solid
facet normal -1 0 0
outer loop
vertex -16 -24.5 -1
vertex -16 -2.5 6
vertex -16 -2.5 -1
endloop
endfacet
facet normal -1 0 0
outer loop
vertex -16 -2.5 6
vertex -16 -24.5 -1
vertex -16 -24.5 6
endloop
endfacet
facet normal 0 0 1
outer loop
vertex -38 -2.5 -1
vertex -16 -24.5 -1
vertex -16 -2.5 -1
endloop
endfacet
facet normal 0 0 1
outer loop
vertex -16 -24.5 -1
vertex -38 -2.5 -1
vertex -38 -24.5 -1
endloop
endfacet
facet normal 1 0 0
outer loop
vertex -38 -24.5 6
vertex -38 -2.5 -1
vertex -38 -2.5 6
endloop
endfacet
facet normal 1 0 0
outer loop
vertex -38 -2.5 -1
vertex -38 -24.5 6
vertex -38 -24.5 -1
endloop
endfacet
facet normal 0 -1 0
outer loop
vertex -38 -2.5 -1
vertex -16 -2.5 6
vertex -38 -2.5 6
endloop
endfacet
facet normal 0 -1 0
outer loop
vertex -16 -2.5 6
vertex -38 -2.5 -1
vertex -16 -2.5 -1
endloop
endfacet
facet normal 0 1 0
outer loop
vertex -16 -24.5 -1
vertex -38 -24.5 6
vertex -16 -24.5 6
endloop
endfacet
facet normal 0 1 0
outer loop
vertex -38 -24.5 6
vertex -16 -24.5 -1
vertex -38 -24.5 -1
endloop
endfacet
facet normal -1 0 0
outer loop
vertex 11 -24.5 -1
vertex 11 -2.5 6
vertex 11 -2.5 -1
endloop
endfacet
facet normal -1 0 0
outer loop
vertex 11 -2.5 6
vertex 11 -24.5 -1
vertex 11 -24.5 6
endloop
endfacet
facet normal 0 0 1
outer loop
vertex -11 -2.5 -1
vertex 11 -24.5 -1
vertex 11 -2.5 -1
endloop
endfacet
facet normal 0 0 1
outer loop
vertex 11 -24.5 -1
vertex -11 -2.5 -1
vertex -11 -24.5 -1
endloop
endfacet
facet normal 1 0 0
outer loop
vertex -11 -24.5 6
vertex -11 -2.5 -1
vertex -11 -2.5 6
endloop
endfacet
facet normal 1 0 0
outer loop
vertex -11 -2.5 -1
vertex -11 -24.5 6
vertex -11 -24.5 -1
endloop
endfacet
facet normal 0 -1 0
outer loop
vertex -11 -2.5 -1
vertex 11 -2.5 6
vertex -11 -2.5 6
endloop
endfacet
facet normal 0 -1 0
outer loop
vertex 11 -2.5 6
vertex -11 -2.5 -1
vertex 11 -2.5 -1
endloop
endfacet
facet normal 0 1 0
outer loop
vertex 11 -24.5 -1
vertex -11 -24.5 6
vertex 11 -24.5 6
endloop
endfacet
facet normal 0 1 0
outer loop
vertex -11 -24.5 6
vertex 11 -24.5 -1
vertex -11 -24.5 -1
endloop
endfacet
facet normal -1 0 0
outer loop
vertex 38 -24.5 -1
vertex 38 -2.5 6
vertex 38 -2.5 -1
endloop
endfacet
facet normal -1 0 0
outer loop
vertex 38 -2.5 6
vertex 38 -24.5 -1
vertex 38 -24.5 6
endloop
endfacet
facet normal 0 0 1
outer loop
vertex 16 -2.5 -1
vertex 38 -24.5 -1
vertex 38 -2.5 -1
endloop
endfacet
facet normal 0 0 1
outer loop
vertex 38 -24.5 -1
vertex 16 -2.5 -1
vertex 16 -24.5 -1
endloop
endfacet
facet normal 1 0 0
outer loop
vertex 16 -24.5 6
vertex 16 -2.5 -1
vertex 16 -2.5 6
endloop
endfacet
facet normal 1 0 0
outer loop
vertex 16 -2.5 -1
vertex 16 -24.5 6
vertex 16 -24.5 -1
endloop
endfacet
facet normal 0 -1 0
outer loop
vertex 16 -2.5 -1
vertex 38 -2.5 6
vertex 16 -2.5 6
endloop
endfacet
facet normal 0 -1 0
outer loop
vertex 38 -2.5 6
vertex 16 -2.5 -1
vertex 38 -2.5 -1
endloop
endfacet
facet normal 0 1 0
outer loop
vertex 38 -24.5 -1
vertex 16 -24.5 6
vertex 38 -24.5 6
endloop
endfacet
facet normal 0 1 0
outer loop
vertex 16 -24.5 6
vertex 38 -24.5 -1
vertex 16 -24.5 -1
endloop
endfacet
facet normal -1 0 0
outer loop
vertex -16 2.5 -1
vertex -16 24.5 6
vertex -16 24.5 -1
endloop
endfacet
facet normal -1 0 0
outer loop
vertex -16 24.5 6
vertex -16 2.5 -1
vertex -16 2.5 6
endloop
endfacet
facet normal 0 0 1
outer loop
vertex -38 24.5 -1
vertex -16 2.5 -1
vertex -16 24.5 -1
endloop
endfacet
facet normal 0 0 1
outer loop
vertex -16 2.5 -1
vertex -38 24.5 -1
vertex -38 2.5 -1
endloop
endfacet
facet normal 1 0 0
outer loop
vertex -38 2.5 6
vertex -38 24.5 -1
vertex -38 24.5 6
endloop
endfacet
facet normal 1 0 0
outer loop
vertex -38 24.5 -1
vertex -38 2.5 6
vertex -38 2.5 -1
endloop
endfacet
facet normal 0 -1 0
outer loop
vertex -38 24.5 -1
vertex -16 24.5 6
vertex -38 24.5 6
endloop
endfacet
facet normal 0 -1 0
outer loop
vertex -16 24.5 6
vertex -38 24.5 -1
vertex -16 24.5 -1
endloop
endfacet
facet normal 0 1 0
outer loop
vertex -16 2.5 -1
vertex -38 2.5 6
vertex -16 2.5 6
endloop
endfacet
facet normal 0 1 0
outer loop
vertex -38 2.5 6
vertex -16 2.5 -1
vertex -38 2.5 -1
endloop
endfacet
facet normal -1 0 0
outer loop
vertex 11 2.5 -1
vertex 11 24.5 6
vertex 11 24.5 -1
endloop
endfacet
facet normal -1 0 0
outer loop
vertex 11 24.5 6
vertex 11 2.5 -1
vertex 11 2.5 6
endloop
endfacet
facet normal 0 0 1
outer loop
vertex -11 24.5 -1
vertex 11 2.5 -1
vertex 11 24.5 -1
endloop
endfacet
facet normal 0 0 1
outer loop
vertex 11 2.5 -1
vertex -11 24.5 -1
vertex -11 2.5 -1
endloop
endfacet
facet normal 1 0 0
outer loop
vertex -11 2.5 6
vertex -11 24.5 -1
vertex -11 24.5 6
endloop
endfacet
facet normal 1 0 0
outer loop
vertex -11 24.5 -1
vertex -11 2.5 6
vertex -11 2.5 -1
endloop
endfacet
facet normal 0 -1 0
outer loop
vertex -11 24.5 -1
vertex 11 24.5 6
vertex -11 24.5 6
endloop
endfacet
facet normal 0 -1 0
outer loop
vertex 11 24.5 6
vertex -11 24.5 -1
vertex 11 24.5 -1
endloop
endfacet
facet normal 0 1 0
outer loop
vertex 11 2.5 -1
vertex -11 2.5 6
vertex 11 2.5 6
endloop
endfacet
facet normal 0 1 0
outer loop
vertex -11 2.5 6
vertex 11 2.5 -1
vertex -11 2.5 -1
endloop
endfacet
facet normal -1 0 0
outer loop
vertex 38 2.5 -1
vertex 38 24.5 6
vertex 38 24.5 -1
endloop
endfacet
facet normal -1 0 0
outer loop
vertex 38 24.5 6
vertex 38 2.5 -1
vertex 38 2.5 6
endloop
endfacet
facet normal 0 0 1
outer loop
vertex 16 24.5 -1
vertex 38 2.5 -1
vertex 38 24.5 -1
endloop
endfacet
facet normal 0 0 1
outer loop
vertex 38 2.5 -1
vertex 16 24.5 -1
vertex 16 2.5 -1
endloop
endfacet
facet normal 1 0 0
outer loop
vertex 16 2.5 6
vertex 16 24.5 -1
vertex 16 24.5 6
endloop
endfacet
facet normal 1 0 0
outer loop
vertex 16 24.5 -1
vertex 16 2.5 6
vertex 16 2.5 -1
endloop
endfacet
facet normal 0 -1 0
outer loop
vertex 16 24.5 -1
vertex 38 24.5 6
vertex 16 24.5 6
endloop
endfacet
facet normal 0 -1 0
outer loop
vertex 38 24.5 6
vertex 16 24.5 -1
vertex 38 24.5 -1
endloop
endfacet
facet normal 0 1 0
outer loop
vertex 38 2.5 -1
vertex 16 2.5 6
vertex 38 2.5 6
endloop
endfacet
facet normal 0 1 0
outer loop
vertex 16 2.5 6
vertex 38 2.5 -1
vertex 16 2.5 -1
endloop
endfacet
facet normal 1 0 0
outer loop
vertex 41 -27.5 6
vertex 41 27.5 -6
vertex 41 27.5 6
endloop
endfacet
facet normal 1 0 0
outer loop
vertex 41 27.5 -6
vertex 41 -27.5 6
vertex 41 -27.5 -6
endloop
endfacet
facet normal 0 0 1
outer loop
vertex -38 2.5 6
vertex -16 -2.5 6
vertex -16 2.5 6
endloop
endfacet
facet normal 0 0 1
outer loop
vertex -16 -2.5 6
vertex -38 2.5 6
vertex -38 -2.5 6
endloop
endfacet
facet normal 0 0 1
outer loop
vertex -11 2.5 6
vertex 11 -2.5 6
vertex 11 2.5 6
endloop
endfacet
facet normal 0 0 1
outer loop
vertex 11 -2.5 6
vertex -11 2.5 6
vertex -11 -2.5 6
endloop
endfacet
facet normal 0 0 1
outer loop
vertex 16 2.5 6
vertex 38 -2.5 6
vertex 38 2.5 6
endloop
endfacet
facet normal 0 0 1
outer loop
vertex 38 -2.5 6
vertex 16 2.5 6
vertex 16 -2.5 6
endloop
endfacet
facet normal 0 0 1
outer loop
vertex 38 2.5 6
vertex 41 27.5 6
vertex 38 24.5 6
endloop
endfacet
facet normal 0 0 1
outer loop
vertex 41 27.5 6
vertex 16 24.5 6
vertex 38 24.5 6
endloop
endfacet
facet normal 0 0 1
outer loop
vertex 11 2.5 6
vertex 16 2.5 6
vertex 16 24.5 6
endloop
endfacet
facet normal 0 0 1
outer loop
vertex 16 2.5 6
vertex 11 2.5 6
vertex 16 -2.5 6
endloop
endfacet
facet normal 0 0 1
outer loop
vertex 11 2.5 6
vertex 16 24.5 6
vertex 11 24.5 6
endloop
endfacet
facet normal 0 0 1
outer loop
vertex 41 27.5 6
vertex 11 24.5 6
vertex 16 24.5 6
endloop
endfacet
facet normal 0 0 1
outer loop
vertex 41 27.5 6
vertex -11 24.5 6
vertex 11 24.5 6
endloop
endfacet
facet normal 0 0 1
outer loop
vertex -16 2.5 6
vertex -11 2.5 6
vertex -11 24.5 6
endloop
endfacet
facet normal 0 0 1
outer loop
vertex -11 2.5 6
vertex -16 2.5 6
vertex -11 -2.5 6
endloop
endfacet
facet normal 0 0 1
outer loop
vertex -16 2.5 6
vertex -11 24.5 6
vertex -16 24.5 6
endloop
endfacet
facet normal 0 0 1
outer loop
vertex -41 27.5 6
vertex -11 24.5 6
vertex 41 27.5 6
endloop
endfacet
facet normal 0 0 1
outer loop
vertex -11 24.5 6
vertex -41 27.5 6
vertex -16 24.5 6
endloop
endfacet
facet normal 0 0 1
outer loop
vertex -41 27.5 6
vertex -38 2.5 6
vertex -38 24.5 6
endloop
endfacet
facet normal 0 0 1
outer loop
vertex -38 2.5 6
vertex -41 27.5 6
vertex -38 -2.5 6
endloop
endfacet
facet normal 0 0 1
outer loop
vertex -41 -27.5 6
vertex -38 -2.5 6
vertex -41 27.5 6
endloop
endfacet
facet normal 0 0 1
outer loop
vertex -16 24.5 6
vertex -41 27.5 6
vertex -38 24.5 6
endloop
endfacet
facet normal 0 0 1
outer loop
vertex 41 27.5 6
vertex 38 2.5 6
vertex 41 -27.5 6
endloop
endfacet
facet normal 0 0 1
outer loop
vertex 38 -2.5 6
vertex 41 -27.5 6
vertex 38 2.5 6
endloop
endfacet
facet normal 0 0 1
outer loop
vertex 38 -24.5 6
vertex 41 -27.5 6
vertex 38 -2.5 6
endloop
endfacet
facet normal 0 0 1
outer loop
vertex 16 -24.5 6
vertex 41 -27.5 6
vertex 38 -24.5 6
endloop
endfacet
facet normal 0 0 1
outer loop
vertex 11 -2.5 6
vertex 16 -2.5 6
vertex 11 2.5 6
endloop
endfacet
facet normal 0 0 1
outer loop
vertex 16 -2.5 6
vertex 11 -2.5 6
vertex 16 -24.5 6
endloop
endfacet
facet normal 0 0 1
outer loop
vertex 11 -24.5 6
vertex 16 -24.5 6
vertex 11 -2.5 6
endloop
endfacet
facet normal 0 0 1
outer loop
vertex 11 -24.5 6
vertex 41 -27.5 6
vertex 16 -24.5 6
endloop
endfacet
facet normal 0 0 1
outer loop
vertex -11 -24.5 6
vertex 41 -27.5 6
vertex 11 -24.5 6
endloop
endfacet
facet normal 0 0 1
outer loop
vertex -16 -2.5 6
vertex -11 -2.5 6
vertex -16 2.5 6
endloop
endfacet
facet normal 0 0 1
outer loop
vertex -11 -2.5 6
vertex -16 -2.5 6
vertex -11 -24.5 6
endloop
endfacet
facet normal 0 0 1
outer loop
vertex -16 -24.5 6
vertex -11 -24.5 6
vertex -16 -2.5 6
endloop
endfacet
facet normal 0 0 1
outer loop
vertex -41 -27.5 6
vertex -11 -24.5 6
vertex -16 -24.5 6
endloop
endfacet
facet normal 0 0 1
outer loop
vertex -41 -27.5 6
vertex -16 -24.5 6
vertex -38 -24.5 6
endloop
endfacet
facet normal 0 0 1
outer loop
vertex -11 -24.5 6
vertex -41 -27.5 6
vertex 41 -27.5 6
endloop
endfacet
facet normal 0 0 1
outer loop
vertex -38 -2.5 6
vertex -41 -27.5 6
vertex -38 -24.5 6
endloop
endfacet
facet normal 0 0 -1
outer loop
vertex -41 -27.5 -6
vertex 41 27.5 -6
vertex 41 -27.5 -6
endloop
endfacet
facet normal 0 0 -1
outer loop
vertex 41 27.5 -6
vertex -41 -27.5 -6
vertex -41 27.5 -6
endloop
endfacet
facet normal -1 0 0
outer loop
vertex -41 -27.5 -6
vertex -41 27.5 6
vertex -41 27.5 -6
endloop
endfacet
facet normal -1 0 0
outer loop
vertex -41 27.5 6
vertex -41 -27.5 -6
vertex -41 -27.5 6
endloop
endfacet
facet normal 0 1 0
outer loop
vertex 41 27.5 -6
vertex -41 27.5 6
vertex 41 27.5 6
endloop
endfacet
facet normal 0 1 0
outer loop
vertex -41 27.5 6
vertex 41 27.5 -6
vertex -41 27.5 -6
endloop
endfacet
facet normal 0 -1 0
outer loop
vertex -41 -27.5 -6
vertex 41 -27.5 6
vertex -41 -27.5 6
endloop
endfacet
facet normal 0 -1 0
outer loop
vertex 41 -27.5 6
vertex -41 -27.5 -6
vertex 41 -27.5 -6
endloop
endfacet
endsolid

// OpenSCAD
$fn = 32;

// ----------------------------------------------------------------------
// Pocket plate 82 x 55 x 12
// 2 x 3 pockets 22 mm square, 7 mm deep
// ----------------------------------------------------------------------

// --- parameters (mm) ---
thickness = 12;  // plate thickness
floor_t = 5;     // material left under each pocket
pocket = 22;     // pocket side length
pitch_x = 27;    // pocket pitch along X
pitch_y = 27;    // pocket pitch along Y
cols = 3;        // pockets per row
rows = 2;        // rows of pockets

// --- derived feature positions (mm) ---
depth = thickness - floor_t;        // = 7   pocket depth, down to the floor
span_x = (cols - 1) * pitch_x;      // = 54   distance between outer pockets
span_y = (rows - 1) * pitch_y;      // = 27   distance between outer pocket rows
origin_x = -span_x / 2;             // = -27   X of the first pocket
origin_y = -span_y / 2;             // = -13.5   Y of the first pocket
plate = [span_x + pocket + 6, span_y + pocket + 6, thickness];  // = [82, 55, 12]   overall size: pockets plus 3 mm of wall on each side
feature_centers = [
  [origin_x + 0 * pitch_x, origin_y + 0 * pitch_y],
  [origin_x + 1 * pitch_x, origin_y + 0 * pitch_y],
  [origin_x + 2 * pitch_x, origin_y + 0 * pitch_y],
  [origin_x + 0 * pitch_x, origin_y + 1 * pitch_y],
  [origin_x + 1 * pitch_x, origin_y + 1 * pitch_y],
  [origin_x + 2 * pitch_x, origin_y + 1 * pitch_y]
];   // pocket centres, used verbatim by the cutter loop

// plate outline, then one pocket per centre in feature_centers
difference() {
  cube(plate, center = true);
  for (centre = feature_centers)
    translate([centre[0] - pocket / 2, centre[1] - pocket / 2, plate[2] / 2 - depth])
      cube([pocket, pocket, depth + 1]);  // centred on the declared pocket centre
}
